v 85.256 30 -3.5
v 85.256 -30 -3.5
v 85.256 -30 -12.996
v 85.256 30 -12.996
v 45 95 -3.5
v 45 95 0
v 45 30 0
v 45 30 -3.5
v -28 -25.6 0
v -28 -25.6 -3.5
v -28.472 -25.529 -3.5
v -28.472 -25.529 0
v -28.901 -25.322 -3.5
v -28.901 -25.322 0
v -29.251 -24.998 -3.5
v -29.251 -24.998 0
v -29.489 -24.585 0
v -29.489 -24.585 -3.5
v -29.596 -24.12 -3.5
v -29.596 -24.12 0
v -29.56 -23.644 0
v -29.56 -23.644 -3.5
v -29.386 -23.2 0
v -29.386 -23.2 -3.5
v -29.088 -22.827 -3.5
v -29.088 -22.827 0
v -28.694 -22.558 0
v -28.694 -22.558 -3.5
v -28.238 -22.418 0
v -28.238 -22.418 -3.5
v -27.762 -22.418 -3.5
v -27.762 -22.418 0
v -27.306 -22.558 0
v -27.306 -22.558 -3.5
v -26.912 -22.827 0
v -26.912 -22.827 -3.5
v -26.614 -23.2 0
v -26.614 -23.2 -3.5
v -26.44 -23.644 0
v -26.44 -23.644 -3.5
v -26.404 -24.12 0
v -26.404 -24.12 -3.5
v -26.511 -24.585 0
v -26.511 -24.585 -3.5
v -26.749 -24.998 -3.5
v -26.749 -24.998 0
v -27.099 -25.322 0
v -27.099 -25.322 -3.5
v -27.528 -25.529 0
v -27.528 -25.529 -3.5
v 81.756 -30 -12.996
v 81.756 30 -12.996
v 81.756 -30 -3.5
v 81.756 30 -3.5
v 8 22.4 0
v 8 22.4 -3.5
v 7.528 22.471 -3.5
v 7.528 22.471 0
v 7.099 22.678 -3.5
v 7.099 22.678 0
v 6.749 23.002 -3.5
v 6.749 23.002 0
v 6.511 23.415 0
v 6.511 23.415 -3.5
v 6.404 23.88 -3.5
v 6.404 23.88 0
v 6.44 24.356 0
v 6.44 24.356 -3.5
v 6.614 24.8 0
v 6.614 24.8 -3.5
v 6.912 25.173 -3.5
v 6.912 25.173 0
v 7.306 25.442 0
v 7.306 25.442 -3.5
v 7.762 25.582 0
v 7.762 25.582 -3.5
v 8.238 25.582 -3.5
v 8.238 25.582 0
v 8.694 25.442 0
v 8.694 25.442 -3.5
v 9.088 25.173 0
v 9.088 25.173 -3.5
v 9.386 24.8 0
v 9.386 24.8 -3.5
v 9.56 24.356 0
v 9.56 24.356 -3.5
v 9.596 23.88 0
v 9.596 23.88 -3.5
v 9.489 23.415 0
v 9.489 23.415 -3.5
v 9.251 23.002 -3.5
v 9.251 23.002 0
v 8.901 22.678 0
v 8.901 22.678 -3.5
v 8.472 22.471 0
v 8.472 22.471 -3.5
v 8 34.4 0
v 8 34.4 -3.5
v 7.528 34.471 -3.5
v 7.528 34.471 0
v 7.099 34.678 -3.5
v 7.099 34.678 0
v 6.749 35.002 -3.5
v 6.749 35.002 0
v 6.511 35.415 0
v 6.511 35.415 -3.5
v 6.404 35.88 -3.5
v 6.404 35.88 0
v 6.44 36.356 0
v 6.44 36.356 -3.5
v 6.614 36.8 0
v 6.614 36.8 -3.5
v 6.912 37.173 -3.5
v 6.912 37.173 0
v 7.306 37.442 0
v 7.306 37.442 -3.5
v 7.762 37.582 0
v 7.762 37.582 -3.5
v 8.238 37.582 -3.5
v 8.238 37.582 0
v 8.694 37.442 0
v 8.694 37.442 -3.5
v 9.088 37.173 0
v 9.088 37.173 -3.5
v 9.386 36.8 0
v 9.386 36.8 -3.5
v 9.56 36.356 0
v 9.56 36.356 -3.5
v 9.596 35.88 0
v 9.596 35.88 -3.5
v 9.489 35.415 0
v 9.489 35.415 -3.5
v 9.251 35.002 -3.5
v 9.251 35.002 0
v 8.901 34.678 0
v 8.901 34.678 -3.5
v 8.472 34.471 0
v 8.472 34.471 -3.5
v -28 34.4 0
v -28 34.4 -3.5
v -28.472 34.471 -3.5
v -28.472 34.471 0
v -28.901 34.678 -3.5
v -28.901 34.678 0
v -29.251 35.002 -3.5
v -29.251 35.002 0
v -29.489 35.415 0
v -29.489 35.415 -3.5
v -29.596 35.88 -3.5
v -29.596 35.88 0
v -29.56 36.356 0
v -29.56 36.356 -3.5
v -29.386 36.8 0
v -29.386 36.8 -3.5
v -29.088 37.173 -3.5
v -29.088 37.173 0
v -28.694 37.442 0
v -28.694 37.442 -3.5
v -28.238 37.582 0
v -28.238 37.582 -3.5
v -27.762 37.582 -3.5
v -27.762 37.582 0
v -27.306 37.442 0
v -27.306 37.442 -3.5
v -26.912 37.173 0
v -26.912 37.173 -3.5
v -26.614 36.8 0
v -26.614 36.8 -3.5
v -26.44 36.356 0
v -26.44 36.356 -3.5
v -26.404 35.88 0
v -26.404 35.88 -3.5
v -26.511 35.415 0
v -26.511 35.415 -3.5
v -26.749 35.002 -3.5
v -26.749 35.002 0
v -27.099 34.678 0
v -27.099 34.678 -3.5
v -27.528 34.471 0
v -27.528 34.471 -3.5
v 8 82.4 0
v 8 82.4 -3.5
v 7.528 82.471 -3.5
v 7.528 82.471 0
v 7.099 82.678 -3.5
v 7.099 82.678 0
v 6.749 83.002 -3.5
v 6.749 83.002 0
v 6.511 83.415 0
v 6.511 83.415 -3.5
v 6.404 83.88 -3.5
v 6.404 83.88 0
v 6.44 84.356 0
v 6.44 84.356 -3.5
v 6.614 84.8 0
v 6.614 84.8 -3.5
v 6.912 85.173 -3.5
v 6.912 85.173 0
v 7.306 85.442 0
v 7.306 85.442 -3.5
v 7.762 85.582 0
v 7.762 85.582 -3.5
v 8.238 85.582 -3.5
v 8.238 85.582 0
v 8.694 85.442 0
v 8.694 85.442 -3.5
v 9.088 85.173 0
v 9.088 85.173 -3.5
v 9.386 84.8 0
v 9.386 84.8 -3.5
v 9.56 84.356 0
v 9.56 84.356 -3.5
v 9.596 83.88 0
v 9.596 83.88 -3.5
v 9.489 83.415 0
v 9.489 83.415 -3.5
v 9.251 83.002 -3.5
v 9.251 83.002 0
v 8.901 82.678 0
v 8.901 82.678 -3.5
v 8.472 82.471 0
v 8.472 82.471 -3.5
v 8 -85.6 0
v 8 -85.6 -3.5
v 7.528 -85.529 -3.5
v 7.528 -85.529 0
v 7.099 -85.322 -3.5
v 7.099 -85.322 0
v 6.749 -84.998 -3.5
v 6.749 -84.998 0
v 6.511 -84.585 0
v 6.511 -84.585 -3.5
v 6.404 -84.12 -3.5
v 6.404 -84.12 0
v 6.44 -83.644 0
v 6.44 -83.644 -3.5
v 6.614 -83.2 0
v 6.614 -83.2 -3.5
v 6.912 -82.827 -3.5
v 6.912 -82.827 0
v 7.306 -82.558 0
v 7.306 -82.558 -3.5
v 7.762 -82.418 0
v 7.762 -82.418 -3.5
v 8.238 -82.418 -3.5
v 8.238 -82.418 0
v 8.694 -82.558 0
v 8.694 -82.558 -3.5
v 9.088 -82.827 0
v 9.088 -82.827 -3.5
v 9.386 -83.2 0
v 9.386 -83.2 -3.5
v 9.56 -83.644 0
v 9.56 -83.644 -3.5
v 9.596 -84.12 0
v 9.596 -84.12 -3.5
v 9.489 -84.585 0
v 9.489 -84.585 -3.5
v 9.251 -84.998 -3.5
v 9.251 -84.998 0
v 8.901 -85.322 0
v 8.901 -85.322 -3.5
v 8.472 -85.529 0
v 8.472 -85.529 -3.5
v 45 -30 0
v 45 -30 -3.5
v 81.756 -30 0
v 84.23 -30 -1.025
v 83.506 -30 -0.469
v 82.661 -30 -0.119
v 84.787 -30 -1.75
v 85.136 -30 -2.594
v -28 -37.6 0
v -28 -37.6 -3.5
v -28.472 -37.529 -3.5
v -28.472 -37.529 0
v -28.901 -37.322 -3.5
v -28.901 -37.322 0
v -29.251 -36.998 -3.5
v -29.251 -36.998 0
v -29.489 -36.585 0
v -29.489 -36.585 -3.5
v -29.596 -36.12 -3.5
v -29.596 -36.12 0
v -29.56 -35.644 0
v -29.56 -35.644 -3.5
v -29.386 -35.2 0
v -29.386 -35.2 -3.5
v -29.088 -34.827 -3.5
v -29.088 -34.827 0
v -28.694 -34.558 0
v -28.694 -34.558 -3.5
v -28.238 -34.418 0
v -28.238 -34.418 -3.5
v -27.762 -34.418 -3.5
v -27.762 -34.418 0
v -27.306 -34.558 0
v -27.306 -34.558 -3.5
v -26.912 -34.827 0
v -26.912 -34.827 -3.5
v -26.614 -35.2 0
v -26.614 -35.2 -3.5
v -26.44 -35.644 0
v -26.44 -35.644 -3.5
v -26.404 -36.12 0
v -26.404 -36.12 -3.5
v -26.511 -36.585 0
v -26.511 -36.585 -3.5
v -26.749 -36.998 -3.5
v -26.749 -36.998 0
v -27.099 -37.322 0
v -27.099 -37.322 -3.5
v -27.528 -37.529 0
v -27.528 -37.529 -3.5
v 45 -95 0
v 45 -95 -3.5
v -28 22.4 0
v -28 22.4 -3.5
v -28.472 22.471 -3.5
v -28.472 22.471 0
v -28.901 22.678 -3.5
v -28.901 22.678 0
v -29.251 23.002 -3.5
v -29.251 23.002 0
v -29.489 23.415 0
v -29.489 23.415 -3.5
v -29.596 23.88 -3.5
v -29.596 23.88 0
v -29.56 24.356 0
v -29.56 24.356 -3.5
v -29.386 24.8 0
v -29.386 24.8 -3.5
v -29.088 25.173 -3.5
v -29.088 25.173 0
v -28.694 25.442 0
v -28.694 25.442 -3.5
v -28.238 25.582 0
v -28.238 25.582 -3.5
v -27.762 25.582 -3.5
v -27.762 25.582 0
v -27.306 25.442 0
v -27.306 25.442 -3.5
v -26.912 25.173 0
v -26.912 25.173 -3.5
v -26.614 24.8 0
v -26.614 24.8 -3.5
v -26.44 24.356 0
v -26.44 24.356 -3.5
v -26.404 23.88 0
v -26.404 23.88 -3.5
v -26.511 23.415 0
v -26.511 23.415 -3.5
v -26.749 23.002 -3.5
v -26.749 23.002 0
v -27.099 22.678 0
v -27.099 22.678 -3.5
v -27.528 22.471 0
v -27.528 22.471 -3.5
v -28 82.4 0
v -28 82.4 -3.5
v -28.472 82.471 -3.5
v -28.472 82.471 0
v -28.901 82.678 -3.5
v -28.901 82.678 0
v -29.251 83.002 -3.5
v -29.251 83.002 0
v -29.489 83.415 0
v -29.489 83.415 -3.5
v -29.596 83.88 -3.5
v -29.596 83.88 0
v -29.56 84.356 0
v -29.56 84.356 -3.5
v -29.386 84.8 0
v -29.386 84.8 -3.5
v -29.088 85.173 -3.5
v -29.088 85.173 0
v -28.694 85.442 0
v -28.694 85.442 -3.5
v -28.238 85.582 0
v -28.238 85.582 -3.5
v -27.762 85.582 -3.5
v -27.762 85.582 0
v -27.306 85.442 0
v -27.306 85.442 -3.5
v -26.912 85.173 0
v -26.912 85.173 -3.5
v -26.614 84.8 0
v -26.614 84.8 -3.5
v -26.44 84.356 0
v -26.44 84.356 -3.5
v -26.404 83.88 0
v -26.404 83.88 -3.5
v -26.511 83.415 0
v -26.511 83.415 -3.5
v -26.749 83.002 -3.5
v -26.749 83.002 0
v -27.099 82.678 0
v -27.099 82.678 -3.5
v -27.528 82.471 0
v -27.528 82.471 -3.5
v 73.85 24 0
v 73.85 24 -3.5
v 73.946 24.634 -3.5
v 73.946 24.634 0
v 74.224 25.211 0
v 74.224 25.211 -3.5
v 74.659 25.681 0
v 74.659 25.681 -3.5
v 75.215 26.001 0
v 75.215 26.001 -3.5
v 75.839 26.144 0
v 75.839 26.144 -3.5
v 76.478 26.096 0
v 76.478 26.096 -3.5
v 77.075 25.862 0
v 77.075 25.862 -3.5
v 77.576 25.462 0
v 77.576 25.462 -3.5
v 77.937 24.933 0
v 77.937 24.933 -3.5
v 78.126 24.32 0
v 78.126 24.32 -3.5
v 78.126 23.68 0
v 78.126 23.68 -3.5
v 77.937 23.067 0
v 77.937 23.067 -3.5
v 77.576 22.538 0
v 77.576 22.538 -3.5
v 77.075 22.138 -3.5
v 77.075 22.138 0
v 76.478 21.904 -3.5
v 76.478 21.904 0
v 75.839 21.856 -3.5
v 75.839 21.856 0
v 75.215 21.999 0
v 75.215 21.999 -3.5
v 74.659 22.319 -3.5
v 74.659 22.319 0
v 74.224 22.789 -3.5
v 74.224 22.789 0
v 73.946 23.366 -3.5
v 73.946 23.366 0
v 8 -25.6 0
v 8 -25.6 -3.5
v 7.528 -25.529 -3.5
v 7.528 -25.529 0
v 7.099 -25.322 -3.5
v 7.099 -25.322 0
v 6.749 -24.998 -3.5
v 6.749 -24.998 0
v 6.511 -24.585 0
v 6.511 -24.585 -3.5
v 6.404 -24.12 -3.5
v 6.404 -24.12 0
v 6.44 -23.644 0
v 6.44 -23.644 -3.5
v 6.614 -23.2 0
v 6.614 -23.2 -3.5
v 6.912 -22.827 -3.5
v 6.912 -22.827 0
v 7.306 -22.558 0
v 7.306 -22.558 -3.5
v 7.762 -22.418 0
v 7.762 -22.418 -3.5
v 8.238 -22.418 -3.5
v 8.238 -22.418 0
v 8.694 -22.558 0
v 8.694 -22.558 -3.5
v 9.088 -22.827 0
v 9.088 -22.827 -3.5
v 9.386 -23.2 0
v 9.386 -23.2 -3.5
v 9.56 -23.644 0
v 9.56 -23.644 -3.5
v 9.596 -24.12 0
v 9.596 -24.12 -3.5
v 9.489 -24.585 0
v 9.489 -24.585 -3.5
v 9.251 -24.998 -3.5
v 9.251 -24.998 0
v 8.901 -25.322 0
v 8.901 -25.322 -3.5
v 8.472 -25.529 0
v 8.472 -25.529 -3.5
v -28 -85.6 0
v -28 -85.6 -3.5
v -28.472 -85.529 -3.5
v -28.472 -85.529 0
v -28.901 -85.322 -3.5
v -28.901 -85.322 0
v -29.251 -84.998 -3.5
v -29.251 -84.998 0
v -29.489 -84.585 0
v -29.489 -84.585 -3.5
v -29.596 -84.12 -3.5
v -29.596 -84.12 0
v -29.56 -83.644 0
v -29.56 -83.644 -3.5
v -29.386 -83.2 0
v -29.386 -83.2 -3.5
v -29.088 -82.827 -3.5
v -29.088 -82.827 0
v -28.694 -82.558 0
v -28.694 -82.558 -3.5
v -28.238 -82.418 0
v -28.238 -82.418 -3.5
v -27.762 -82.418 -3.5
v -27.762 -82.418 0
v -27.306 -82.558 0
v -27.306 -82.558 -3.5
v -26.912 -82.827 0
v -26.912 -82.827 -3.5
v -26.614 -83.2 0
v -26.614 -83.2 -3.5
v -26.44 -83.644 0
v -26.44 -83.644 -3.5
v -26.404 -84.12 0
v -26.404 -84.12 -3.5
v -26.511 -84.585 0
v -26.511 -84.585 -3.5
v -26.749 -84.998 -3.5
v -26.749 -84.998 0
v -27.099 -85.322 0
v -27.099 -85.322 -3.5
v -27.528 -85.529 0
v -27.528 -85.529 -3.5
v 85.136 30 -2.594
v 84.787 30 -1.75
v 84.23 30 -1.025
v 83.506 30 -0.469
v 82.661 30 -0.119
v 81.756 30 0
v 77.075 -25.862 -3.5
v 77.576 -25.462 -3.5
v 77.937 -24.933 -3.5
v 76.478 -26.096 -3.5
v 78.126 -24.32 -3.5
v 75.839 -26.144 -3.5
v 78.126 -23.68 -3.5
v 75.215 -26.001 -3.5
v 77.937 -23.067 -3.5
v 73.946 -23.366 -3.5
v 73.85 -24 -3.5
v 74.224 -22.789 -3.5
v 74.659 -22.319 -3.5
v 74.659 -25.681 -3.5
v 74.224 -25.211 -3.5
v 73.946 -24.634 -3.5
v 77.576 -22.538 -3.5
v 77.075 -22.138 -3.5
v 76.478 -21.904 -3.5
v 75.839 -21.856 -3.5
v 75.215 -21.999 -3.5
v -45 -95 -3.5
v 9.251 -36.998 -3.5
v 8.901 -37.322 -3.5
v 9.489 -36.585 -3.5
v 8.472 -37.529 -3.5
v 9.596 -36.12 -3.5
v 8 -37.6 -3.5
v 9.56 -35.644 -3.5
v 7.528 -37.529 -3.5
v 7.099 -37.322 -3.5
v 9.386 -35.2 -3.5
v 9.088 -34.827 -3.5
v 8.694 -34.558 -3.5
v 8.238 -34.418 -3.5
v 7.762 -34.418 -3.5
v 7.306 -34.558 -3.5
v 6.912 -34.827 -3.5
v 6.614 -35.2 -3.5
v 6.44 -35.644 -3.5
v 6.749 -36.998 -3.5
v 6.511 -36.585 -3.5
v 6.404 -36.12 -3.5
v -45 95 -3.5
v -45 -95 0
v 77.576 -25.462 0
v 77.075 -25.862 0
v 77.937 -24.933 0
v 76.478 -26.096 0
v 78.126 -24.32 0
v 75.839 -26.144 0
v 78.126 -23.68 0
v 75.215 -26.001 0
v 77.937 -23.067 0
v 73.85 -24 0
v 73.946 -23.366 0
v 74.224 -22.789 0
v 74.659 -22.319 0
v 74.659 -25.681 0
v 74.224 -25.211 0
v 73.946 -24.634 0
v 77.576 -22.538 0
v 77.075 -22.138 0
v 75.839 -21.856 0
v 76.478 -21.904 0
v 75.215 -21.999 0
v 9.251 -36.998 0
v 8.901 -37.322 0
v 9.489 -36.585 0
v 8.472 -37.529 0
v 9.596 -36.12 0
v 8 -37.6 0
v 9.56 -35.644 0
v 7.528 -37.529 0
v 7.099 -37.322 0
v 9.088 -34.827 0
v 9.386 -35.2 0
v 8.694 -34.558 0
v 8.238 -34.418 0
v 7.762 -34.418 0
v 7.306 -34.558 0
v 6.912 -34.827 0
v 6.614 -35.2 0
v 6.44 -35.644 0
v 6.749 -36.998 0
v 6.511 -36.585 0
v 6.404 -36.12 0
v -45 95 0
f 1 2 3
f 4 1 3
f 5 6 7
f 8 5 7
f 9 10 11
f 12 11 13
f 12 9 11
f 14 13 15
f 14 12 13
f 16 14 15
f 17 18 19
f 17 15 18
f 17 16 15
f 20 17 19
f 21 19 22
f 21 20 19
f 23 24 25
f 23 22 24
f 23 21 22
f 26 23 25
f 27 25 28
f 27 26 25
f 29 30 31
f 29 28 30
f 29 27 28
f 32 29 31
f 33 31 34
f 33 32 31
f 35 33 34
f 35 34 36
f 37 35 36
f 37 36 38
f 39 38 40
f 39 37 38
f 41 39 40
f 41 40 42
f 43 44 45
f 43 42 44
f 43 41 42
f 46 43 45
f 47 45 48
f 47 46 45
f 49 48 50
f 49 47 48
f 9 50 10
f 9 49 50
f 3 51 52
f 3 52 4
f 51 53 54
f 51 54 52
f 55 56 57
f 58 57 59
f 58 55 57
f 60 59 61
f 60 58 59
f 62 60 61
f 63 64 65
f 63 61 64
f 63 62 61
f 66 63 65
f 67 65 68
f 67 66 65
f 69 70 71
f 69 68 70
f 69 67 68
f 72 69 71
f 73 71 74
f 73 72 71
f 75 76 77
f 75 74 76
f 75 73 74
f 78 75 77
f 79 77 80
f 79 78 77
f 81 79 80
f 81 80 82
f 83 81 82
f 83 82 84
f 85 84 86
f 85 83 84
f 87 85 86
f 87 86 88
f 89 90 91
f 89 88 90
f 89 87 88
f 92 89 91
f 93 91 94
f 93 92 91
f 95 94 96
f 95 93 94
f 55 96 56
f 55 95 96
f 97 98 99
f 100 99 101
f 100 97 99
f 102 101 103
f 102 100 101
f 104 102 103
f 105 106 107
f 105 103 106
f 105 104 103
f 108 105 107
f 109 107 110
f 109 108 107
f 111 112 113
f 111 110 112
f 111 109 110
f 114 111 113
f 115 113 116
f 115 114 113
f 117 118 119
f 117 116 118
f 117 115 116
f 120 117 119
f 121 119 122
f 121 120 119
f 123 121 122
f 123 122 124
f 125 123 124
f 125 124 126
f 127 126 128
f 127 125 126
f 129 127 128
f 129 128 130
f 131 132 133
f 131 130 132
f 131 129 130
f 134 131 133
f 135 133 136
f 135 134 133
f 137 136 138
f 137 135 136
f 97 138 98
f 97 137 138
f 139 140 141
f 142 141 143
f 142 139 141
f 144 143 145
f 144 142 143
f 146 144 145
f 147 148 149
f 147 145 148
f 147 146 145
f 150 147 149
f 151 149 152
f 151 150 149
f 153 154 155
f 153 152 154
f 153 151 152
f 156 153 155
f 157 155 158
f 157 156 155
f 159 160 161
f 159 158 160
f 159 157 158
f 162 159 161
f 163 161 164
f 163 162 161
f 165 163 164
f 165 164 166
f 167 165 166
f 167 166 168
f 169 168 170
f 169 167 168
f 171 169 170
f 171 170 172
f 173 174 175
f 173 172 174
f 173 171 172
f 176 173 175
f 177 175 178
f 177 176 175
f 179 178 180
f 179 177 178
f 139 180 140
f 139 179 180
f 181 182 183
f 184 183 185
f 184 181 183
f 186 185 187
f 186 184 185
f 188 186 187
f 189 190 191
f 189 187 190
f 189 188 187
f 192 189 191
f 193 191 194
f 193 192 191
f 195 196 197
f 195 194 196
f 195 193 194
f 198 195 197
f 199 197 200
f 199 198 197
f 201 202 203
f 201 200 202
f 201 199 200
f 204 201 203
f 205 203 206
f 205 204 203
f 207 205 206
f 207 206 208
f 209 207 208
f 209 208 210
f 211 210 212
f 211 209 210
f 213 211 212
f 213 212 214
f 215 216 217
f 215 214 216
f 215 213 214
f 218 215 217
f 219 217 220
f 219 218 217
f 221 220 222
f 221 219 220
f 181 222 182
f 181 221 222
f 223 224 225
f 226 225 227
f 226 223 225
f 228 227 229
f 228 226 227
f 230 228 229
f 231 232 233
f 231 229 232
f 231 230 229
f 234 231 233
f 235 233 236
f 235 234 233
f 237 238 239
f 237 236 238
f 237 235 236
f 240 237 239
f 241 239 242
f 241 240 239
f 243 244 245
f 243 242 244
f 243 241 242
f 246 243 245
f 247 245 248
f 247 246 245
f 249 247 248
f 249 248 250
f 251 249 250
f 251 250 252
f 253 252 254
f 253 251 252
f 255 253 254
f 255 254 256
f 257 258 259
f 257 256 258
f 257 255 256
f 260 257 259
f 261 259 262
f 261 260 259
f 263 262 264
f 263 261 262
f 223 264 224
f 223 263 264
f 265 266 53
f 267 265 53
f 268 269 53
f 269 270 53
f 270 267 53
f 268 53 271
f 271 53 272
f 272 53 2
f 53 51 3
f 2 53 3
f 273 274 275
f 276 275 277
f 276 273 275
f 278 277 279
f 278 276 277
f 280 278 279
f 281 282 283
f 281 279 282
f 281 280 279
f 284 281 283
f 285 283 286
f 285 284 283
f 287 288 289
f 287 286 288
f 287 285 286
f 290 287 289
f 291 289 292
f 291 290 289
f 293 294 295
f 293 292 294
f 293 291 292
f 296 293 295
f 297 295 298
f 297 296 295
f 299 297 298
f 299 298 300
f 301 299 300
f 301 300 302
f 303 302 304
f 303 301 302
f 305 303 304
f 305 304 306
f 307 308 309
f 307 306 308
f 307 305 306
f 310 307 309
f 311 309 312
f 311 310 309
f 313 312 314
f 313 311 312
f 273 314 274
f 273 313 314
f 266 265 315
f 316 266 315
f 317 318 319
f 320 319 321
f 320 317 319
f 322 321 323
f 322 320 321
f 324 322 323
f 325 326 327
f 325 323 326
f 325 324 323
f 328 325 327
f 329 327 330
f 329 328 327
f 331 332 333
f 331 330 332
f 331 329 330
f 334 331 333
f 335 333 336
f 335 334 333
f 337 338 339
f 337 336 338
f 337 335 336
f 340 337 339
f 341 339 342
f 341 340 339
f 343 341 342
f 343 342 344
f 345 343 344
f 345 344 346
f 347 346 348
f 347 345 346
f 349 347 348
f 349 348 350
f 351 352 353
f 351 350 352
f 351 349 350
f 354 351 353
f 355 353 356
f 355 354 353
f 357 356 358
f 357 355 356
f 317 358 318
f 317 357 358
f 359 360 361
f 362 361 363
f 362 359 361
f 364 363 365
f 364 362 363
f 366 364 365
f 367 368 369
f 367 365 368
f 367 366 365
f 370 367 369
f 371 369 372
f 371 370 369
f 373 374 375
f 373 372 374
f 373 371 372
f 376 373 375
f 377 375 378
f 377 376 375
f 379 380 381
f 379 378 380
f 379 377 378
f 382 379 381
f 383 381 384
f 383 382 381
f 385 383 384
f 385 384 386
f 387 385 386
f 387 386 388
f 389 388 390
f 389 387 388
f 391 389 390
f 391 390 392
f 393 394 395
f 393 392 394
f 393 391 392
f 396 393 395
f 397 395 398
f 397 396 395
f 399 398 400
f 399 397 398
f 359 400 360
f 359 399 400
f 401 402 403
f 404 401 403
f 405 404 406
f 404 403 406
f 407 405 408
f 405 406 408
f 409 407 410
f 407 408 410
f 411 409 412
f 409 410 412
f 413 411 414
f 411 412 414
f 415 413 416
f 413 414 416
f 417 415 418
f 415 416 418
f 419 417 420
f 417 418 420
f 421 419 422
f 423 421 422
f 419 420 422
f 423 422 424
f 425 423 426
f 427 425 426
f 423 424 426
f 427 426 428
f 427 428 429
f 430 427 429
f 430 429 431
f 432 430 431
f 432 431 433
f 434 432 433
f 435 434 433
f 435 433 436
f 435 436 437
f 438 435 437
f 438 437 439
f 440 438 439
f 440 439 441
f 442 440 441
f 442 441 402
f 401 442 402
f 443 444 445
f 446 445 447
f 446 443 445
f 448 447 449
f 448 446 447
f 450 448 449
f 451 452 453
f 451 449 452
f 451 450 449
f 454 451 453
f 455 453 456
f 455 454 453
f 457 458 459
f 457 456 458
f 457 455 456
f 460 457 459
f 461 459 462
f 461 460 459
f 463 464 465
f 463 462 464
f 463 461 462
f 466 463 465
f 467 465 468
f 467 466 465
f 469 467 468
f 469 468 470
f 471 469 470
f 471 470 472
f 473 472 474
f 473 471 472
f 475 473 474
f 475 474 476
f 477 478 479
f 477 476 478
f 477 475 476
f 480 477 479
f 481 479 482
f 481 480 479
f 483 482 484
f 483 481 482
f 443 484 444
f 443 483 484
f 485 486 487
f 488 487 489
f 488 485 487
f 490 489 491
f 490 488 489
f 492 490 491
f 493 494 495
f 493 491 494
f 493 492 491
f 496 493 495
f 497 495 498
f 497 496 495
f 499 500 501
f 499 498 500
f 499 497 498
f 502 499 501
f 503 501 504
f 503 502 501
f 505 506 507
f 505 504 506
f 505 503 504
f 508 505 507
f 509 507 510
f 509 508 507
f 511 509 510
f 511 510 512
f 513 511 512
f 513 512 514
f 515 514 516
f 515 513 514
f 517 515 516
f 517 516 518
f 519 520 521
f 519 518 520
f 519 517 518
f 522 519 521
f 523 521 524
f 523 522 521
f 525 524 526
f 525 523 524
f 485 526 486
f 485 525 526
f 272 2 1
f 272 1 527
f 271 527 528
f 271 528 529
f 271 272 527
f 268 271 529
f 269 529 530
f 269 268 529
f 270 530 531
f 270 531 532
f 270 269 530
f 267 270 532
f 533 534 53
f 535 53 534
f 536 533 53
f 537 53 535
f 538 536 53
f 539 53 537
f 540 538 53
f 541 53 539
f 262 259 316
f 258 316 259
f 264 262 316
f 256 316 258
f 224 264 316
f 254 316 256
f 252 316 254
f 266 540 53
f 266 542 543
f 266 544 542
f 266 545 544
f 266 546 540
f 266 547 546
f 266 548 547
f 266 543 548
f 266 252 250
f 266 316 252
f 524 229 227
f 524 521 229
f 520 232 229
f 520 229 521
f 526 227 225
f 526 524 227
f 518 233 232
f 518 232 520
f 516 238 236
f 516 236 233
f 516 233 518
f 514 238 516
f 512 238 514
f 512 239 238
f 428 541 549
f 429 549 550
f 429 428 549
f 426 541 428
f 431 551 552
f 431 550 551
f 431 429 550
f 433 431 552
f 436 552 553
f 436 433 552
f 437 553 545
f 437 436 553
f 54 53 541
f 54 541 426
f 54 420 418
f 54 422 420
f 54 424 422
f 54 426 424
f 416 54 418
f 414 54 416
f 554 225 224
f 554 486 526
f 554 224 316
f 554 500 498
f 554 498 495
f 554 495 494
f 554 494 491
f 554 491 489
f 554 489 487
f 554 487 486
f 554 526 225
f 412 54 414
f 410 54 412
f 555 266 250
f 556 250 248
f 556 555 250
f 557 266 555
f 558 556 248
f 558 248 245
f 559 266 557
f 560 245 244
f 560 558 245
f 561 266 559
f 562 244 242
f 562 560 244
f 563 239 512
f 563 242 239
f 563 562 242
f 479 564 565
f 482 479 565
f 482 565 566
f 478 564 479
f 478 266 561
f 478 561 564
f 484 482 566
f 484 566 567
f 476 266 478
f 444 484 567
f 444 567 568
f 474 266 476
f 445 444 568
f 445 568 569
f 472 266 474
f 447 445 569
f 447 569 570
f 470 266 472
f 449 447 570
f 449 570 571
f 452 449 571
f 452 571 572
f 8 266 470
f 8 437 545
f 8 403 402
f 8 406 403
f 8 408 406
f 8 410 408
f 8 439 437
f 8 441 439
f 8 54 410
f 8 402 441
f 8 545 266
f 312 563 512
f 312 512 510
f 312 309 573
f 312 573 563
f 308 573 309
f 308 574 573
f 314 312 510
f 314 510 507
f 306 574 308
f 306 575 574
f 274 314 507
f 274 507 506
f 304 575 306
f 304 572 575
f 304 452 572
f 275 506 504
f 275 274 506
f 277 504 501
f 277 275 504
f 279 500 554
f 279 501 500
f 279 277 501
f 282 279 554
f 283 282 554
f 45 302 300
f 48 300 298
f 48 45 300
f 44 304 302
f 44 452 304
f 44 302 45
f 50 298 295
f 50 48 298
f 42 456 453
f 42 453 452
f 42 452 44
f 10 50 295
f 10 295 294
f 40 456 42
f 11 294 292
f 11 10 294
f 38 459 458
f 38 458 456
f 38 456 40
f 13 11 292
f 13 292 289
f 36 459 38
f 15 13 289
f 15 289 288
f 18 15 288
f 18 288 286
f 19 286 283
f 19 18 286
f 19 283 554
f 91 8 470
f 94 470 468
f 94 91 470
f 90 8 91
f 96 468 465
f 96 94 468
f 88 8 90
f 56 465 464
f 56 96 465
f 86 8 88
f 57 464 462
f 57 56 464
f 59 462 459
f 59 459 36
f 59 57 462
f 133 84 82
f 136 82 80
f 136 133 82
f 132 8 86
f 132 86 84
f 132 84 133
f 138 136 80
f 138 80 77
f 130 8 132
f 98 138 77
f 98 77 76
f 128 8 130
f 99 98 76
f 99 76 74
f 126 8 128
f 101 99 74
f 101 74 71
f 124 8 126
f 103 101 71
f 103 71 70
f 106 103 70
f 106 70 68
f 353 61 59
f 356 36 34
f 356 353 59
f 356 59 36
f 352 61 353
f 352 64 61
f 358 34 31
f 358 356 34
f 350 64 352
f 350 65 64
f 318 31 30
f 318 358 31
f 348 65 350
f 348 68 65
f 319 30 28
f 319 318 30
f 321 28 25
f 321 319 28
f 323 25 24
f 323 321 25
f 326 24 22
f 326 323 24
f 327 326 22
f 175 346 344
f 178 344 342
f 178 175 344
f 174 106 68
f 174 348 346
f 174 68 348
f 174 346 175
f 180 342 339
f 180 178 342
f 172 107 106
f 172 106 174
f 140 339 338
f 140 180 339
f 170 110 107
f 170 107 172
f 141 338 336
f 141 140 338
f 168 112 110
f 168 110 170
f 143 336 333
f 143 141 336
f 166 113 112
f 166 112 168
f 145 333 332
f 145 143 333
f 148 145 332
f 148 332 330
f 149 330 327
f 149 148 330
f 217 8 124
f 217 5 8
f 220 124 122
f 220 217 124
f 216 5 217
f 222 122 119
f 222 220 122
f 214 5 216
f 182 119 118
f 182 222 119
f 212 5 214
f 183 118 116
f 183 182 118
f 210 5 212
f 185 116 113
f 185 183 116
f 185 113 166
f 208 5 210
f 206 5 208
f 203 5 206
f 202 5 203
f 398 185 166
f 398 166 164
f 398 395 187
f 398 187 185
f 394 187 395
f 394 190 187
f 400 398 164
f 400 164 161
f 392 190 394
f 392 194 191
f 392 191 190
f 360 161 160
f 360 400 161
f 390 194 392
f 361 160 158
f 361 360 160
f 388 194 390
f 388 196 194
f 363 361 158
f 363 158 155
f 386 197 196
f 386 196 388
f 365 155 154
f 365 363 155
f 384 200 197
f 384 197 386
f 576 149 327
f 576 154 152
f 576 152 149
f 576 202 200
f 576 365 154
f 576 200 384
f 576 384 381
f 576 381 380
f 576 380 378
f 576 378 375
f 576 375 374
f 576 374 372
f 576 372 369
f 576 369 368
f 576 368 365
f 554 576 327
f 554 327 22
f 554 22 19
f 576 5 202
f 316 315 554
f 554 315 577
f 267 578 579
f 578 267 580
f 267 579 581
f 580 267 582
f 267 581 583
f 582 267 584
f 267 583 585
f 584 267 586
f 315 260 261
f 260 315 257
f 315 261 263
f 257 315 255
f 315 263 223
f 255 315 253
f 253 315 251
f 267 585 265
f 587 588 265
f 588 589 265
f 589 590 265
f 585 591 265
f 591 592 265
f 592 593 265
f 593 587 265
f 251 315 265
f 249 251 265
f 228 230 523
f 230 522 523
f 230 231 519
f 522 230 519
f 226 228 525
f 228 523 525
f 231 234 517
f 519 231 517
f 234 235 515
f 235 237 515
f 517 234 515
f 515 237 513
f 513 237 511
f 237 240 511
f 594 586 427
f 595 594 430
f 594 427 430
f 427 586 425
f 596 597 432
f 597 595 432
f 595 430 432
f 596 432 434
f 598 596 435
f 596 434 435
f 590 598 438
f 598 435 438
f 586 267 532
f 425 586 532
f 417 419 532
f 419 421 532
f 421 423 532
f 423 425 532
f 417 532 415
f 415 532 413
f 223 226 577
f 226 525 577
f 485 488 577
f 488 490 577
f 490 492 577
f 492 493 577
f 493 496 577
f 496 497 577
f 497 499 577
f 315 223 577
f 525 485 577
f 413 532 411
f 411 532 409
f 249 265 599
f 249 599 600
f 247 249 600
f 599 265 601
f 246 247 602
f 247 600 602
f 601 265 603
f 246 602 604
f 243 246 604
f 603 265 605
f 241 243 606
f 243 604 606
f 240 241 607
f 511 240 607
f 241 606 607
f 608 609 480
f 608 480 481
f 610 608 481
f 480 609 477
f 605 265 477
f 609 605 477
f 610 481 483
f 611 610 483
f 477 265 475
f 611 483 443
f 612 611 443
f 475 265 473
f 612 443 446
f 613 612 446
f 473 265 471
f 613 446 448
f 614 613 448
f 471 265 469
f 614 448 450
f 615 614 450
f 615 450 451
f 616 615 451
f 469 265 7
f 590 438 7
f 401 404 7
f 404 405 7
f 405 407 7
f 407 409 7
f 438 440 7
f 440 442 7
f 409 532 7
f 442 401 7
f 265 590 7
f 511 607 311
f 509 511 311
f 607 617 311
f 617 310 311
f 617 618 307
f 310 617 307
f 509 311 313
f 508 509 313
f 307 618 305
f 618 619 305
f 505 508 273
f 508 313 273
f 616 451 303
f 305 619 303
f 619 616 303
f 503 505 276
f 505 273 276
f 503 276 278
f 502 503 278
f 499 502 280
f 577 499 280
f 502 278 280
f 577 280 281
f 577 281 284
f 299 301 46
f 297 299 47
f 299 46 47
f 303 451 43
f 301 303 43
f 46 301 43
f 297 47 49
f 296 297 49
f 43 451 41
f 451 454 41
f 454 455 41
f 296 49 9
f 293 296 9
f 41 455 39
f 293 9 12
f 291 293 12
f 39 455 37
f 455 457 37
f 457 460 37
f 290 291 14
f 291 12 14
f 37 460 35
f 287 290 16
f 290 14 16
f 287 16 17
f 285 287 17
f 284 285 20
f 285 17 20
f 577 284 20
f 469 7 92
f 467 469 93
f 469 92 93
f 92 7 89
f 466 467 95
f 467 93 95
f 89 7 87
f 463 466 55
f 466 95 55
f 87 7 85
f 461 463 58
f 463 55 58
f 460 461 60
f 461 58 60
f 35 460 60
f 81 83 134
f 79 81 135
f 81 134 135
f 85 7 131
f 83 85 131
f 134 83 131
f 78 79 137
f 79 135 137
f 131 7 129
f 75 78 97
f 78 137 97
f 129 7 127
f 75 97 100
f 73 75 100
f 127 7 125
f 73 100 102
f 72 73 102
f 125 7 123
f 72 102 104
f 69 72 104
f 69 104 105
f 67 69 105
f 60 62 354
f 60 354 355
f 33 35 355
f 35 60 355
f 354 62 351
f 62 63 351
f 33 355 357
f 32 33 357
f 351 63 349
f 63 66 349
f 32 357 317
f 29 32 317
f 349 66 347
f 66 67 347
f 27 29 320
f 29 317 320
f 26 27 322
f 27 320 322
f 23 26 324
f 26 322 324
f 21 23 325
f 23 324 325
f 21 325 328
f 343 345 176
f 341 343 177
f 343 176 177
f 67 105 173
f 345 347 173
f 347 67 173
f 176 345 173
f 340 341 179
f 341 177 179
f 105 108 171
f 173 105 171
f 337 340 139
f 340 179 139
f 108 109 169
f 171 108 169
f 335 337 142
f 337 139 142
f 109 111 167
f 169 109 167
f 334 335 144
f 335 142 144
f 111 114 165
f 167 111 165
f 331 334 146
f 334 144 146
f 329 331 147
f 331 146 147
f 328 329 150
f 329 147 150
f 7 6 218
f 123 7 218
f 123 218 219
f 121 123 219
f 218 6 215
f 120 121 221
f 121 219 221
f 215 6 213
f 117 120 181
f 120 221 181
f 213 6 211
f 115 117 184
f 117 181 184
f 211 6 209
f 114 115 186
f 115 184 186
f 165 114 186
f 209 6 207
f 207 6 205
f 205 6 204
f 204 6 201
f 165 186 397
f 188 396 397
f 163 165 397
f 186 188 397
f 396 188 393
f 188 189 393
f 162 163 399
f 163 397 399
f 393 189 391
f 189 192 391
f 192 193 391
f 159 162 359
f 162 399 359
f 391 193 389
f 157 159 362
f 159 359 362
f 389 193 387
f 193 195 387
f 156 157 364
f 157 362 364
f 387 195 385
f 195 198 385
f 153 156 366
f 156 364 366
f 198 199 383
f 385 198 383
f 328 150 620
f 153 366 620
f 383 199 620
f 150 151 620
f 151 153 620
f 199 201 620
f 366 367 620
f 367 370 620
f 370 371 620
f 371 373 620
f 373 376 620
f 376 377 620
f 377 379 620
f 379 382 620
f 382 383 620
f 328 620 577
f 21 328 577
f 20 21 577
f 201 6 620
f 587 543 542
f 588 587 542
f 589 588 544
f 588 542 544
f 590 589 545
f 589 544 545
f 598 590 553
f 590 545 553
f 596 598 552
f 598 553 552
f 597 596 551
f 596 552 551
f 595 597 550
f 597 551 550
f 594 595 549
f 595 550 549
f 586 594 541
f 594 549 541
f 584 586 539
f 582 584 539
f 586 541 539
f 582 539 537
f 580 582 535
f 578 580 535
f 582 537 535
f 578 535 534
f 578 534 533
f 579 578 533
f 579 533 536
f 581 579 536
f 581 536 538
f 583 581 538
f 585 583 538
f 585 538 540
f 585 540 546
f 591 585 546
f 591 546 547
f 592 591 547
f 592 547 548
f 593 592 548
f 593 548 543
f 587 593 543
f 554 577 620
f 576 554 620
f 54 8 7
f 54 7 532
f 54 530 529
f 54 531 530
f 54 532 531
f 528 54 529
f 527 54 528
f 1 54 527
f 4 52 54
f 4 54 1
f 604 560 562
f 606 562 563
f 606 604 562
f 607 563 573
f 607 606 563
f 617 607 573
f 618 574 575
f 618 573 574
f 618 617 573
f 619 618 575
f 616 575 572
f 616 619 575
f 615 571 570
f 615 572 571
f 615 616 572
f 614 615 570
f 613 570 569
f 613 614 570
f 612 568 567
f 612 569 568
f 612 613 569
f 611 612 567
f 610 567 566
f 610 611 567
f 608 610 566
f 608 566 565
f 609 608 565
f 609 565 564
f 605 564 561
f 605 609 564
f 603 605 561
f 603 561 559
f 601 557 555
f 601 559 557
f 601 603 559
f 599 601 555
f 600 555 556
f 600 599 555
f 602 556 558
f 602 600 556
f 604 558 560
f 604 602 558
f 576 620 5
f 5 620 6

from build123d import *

# Parameters (mm, degrees)
BASE_FLANGIA1_DEPTH                  = 3.5
PIEGATURA_START                      = -30
PIEGATURA_DELLO_SCHIZZO1_DEPTH       = 60
PIEGATURA_DELLO_SCHIZZO1_2_OUTLINE_W = 3.5
PIEGATURA_DELLO_SCHIZZO1_2_OUTLINE_H = 9.495553214
PIEGATURA_DELLO_SCHIZZO1_2_DEPTH     = 60
FORO_PER_VITE_M4_1_D                 = 4.3
FORO_PER_VITE_M4_1_DEPTH             = 20
FORO_PER_VITE_M4_1_TIP               = 1.291850331
FORO_PER_VITE_M3_1_AT_2_COUNT        = 2
FORO_PER_VITE_M3_1_AT_2_PITCH        = 48
FORO_PER_VITE_M3_1_AT_3_COUNT        = 2
FORO_PER_VITE_M3_1_AT_3_PITCH        = 60
FORO_PER_VITE_M3_1_AT_4_COUNT        = 2
FORO_PER_VITE_M3_1_AT_4_PITCH        = 36
RIPETIZIONE_A_L1_COUNT               = 2
RIPETIZIONE_A_L1_PITCH               = 60
RIPETIZIONE_A_L1_COL_COUNT           = 2
RIPETIZIONE_A_L1_COL_PITCH           = 60


# Read off the part's stored shape, not the designer's step: Piegatura dello schizzo1
# Sheet-metal steps are written as plain solids
with BuildPart() as part:
    # Schizzo1 → Base-Flangia1 (new body)
    with BuildSketch(Plane.XY):
        Polygon((-45, 95), (45, 95), (45, 30), (94, 30), (94, -30), (45, -30), (45, -95), (-45, -95), align=None)
    extrude(amount=-BASE_FLANGIA1_DEPTH)

    # Piegatura dello schizzo1 outline → Piegatura dello schizzo1 (cut)
    with BuildSketch(Plane(origin=(0, 0, 0), x_dir=(1, 0, 0), z_dir=(0, 1, 0)).offset(PIEGATURA_START)):
        with BuildLine():
            Line((94, 3.5), (85.255553214, 3.5))
            ThreePointArc((85.255553214, 3.5), (84.230426948, 1.025126266), (81.755553214, 0))
            Line((81.755553214, 0), (94, 0))
            Line((94, 0), (94, 3.5))
        make_face()
    extrude(amount=PIEGATURA_DELLO_SCHIZZO1_DEPTH, mode=Mode.SUBTRACT)

    # Piegatura dello schizzo1 2 outline → Piegatura dello schizzo1 2 (add)
    with BuildSketch(Plane(origin=(0, 0, 0), x_dir=(1, 0, 0), z_dir=(0, 1, 0)).offset(PIEGATURA_START)):
        with Locations((83.505553214, 8.247776607)):
            Rectangle(PIEGATURA_DELLO_SCHIZZO1_2_OUTLINE_W, PIEGATURA_DELLO_SCHIZZO1_2_OUTLINE_H)
    extrude(amount=PIEGATURA_DELLO_SCHIZZO1_2_DEPTH)

    # Foro per Vite M4-1
    with Locations(Plane(origin=(76, 24, 0), x_dir=(1, 0, 0), z_dir=(0, 0, 1))):
        with Locations((0, 0), (0, -48)):
            Hole(FORO_PER_VITE_M4_1_D / 2, depth=FORO_PER_VITE_M4_1_DEPTH)
            with Locations((0, 0, -(FORO_PER_VITE_M4_1_DEPTH + FORO_PER_VITE_M4_1_TIP / 2))):  # 118° drill point
                Cone(0, FORO_PER_VITE_M4_1_D / 2, FORO_PER_VITE_M4_1_TIP, mode=Mode.SUBTRACT)

    # Schizzo9 → Foro per Vite M3-1 (revolve, cut)
    with BuildSketch(Plane(origin=(-28, 24, 0), x_dir=(0, -1, 0), z_dir=(1, 0, 0))):
        Polygon((0, 0), (0, 20.96137699), (1.6, 20), (1.6, 0), align=None)
    foro_per_vite_m3_1 = revolve(axis=Axis((-28, 24, 6.35), (0, 0, -1)), mode=Mode.SUBTRACT)

    # Foro per Vite M3-1 at 2: Foro per Vite M3-1 ×2
    with Locations(*[(0, -i * FORO_PER_VITE_M3_1_AT_2_PITCH, 0) for i in range(1, FORO_PER_VITE_M3_1_AT_2_COUNT)]):
        add(foro_per_vite_m3_1, mode=Mode.SUBTRACT)

    # Foro per Vite M3-1 at 3: Foro per Vite M3-1 ×2
    with Locations(*[Vector(0.6000000000000001, -0.7999999999999999, 0) * (i * FORO_PER_VITE_M3_1_AT_3_PITCH) for i in range(1, FORO_PER_VITE_M3_1_AT_3_COUNT)]):
        add(foro_per_vite_m3_1, mode=Mode.SUBTRACT)

    # Foro per Vite M3-1 at 4: Foro per Vite M3-1 ×2
    with Locations(*[(i * FORO_PER_VITE_M3_1_AT_4_PITCH, 0, 0) for i in range(1, FORO_PER_VITE_M3_1_AT_4_COUNT)]):
        add(foro_per_vite_m3_1, mode=Mode.SUBTRACT)

    # Ripetizione a L1: Foro per Vite M3-1 ×2
    with Locations(*[(0, -i * RIPETIZIONE_A_L1_PITCH, 0) for i in range(1, RIPETIZIONE_A_L1_COUNT)]):
        add(foro_per_vite_m3_1, mode=Mode.SUBTRACT)

    # Ripetizione a L1 copy 1 sketch → Ripetizione a L1 copy 1 (revolve, cut)
    with BuildSketch(Plane(origin=(-28, -84, 0), x_dir=(0, -1, 0), z_dir=(1, 0, 0))):
        Polygon((0, 0), (0, 20.96137699), (1.6, 20), (1.6, 0), align=None)
    revolve(axis=Axis((-28, -84, 6.35), (0, 0, -1)), mode=Mode.SUBTRACT)

    # Ripetizione a L1 copy 2 sketch → Ripetizione a L1 copy 2 (revolve, cut)
    with BuildSketch(Plane(origin=(8, -84, 0), x_dir=(0, -1, 0), z_dir=(1, 0, 0))):
        Polygon((0, 0), (0, 20.96137699), (1.6, 20), (1.6, 0), align=None)
    revolve(axis=Axis((8, -84, 6.35), (0, 0, -1)), mode=Mode.SUBTRACT)

    # Ripetizione a L1 copy 3 sketch → Ripetizione a L1 copy 3 (revolve, cut)
    with BuildSketch(Plane(origin=(8, -36, 0), x_dir=(0, -1, 0), z_dir=(1, 0, 0))):
        Polygon((0, 0), (0, 20.96137699), (1.6, 20), (1.6, 0), align=None)
    revolve(axis=Axis((8, -36, 6.35), (0, 0, -1)), mode=Mode.SUBTRACT)

    # Ripetizione a L1 col: Foro per Vite M3-1 ×2
    with Locations(*[(0, i * RIPETIZIONE_A_L1_COL_PITCH, 0) for i in range(1, RIPETIZIONE_A_L1_COL_COUNT)]):
        add(foro_per_vite_m3_1, mode=Mode.SUBTRACT)

    # Ripetizione a L1 col copy 1 sketch → Ripetizione a L1 col copy 1 (revolve, cut)
    with BuildSketch(Plane(origin=(-28, 36, 0), x_dir=(0, -1, 0), z_dir=(1, 0, 0))):
        Polygon((0, 0), (0, 20.96137699), (1.6, 20), (1.6, 0), align=None)
    revolve(axis=Axis((-28, 36, 6.35), (0, 0, -1)), mode=Mode.SUBTRACT)

    # Ripetizione a L1 col copy 2 sketch → Ripetizione a L1 col copy 2 (revolve, cut)
    with BuildSketch(Plane(origin=(8, 36, 0), x_dir=(0, -1, 0), z_dir=(1, 0, 0))):
        Polygon((0, 0), (0, 20.96137699), (1.6, 20), (1.6, 0), align=None)
    revolve(axis=Axis((8, 36, 6.35), (0, 0, -1)), mode=Mode.SUBTRACT)

    # Ripetizione a L1 col copy 3 sketch → Ripetizione a L1 col copy 3 (revolve, cut)
    with BuildSketch(Plane(origin=(8, 84, 0), x_dir=(0, -1, 0), z_dir=(1, 0, 0))):
        Polygon((0, 0), (0, 20.96137699), (1.6, 20), (1.6, 0), align=None)
    revolve(axis=Axis((8, 84, 6.35), (0, 0, -1)), mode=Mode.SUBTRACT)


solid = part.part
